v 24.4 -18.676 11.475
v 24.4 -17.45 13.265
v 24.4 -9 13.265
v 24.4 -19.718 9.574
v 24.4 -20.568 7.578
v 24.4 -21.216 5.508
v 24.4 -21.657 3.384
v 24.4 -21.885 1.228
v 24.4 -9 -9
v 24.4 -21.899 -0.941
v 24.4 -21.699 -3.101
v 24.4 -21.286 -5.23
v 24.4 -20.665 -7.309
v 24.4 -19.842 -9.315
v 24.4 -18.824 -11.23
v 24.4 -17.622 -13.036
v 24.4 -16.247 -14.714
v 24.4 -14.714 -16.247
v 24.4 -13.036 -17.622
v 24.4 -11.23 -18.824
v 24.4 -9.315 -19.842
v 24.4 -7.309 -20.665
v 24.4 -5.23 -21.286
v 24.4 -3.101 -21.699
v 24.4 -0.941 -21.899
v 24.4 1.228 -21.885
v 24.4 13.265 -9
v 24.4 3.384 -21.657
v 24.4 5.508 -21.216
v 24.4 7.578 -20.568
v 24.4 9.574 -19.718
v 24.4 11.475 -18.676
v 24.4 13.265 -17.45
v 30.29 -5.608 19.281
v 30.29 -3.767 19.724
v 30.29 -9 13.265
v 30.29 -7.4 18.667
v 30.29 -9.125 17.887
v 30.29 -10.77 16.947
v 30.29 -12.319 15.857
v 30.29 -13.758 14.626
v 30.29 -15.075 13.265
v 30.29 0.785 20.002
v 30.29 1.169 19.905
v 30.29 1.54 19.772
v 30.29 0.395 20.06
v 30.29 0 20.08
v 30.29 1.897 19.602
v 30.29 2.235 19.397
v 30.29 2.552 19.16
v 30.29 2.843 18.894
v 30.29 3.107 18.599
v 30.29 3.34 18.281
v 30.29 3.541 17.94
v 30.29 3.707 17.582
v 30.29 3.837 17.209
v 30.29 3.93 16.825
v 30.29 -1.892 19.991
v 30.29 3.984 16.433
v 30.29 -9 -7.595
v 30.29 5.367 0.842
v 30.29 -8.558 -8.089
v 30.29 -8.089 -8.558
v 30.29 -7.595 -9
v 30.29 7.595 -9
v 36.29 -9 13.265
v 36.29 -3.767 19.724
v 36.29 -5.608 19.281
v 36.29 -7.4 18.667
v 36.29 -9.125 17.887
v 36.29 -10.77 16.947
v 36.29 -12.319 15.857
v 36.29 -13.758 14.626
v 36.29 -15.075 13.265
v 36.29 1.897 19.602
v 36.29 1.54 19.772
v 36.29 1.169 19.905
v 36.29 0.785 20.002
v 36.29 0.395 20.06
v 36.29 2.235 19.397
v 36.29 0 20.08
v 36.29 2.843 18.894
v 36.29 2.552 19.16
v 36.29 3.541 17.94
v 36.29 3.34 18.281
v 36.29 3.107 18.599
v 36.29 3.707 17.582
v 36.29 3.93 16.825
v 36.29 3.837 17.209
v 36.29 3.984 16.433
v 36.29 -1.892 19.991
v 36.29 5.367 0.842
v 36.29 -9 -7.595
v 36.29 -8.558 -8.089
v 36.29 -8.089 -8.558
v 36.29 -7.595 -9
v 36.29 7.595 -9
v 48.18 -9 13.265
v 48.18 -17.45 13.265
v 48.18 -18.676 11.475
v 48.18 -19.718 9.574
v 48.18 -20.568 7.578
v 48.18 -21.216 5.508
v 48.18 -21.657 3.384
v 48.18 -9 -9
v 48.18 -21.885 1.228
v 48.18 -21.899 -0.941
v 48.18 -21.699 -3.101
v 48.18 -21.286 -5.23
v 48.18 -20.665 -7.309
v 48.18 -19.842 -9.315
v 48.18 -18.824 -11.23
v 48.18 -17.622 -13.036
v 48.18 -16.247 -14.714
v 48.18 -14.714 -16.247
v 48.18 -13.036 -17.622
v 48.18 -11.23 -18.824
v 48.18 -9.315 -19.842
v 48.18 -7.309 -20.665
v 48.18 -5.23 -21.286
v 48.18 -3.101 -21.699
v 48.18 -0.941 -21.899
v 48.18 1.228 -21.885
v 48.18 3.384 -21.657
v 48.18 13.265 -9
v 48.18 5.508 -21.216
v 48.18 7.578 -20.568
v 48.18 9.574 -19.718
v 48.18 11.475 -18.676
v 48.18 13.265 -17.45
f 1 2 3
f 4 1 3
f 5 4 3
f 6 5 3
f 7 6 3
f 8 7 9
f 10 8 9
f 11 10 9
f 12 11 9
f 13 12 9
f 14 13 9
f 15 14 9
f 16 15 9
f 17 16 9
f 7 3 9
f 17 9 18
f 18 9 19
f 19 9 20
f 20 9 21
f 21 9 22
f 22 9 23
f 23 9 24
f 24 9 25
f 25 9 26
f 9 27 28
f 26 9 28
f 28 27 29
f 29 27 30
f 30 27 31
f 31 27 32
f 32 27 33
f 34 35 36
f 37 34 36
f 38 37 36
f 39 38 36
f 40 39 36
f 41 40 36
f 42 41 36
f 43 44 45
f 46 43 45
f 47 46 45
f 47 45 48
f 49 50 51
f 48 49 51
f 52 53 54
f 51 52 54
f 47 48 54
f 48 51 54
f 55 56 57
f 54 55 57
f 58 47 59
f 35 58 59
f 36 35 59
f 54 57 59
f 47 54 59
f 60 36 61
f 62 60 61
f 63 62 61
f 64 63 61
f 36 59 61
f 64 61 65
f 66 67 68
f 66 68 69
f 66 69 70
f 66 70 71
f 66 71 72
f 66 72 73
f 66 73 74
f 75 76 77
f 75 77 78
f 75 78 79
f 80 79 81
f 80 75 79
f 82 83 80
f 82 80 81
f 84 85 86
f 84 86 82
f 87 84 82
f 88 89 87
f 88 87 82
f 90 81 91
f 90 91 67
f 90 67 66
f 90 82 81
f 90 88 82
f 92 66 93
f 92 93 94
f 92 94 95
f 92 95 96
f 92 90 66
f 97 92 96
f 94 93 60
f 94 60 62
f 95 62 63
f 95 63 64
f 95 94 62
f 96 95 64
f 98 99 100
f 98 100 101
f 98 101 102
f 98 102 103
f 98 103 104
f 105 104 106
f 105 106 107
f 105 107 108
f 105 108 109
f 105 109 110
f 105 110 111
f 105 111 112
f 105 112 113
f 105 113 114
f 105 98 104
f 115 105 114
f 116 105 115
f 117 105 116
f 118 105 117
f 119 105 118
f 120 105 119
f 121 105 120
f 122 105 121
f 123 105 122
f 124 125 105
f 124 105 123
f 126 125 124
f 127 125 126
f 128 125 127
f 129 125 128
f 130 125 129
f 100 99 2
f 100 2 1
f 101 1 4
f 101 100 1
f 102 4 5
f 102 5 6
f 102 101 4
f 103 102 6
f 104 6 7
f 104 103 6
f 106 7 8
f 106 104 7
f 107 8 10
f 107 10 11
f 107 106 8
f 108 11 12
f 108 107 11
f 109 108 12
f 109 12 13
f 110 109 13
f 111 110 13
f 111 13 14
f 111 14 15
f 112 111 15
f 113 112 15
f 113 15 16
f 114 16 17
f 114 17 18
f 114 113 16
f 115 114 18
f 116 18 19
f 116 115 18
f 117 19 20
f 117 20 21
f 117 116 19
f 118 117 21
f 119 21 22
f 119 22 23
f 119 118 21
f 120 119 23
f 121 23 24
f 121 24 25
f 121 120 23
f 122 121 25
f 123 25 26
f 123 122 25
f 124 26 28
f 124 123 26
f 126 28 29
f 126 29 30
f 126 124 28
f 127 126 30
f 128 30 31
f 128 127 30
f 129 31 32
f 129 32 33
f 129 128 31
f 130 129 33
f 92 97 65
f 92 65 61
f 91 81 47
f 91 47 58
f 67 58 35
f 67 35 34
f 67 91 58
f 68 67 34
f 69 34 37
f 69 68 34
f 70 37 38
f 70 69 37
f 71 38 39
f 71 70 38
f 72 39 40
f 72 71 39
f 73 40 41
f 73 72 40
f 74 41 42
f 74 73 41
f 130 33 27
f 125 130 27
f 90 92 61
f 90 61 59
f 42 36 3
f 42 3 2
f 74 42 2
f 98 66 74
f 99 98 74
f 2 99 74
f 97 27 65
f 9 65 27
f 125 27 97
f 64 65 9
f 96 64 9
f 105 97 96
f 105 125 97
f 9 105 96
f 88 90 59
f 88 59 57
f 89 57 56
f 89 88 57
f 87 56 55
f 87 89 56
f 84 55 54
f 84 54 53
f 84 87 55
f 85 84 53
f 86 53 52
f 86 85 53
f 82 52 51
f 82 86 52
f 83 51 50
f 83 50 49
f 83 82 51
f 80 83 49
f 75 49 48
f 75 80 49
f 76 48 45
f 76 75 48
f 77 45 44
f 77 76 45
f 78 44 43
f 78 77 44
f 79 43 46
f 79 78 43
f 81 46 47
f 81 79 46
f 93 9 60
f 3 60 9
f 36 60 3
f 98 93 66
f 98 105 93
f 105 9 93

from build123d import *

# Parameters (mm, degrees)
BOSS_EXTRUDE1_DEPTH = 23.78
BOSS_EXTRUDE2_DEPTH = 6


with BuildPart() as part:
    # Sketch3 → Boss-Extrude1 (new body)
    with BuildSketch(Plane(origin=(48.18, 0, 0), x_dir=(0, 0, -1), z_dir=(1, 0, 0))):
        with BuildLine():
            Line((17.45, 13.265), (9, 13.265))
            Line((9, 13.265), (9, -9))
            Line((9, -9), (-13.265, -9))
            Line((-13.265, -9), (-13.265, -17.45))
            ThreePointArc((-13.265, -17.45), (15.499398779, -15.499398779), (17.45, 13.265))
        make_face()
    extrude(amount=-BOSS_EXTRUDE1_DEPTH)

    # Sketch4 → Boss-Extrude2 (add)
    with BuildSketch(Plane(origin=(36.29, 0, 0), x_dir=(0, 0, -1), z_dir=(1, 0, 0))):
        with BuildLine():
            Line((3.984372706, -16.433233831), (4.643364687, -9))
            Line((4.643364687, -9), (7.595, -9))
            ThreePointArc((7.595, -9), (11.734437034, -0.993485028), (9, 7.595))
            Line((9, 7.595), (-0.841557906, 5.366649873))
            Line((-0.841557906, 5.366649873), (-16.433233831, 3.984372706))
            ThreePointArc((-16.433233831, 3.984372706), (-19.030672408, 2.700654058), (-20.08, 0))
            ThreePointArc((-20.08, 0), (-14.198704166, -14.198704166), (0, -20.08))
            ThreePointArc((0, -20.08), (2.700654058, -19.030672408), (3.984372706, -16.433233831))
        make_face()
    extrude(amount=-BOSS_EXTRUDE2_DEPTH)


solid = part.part
